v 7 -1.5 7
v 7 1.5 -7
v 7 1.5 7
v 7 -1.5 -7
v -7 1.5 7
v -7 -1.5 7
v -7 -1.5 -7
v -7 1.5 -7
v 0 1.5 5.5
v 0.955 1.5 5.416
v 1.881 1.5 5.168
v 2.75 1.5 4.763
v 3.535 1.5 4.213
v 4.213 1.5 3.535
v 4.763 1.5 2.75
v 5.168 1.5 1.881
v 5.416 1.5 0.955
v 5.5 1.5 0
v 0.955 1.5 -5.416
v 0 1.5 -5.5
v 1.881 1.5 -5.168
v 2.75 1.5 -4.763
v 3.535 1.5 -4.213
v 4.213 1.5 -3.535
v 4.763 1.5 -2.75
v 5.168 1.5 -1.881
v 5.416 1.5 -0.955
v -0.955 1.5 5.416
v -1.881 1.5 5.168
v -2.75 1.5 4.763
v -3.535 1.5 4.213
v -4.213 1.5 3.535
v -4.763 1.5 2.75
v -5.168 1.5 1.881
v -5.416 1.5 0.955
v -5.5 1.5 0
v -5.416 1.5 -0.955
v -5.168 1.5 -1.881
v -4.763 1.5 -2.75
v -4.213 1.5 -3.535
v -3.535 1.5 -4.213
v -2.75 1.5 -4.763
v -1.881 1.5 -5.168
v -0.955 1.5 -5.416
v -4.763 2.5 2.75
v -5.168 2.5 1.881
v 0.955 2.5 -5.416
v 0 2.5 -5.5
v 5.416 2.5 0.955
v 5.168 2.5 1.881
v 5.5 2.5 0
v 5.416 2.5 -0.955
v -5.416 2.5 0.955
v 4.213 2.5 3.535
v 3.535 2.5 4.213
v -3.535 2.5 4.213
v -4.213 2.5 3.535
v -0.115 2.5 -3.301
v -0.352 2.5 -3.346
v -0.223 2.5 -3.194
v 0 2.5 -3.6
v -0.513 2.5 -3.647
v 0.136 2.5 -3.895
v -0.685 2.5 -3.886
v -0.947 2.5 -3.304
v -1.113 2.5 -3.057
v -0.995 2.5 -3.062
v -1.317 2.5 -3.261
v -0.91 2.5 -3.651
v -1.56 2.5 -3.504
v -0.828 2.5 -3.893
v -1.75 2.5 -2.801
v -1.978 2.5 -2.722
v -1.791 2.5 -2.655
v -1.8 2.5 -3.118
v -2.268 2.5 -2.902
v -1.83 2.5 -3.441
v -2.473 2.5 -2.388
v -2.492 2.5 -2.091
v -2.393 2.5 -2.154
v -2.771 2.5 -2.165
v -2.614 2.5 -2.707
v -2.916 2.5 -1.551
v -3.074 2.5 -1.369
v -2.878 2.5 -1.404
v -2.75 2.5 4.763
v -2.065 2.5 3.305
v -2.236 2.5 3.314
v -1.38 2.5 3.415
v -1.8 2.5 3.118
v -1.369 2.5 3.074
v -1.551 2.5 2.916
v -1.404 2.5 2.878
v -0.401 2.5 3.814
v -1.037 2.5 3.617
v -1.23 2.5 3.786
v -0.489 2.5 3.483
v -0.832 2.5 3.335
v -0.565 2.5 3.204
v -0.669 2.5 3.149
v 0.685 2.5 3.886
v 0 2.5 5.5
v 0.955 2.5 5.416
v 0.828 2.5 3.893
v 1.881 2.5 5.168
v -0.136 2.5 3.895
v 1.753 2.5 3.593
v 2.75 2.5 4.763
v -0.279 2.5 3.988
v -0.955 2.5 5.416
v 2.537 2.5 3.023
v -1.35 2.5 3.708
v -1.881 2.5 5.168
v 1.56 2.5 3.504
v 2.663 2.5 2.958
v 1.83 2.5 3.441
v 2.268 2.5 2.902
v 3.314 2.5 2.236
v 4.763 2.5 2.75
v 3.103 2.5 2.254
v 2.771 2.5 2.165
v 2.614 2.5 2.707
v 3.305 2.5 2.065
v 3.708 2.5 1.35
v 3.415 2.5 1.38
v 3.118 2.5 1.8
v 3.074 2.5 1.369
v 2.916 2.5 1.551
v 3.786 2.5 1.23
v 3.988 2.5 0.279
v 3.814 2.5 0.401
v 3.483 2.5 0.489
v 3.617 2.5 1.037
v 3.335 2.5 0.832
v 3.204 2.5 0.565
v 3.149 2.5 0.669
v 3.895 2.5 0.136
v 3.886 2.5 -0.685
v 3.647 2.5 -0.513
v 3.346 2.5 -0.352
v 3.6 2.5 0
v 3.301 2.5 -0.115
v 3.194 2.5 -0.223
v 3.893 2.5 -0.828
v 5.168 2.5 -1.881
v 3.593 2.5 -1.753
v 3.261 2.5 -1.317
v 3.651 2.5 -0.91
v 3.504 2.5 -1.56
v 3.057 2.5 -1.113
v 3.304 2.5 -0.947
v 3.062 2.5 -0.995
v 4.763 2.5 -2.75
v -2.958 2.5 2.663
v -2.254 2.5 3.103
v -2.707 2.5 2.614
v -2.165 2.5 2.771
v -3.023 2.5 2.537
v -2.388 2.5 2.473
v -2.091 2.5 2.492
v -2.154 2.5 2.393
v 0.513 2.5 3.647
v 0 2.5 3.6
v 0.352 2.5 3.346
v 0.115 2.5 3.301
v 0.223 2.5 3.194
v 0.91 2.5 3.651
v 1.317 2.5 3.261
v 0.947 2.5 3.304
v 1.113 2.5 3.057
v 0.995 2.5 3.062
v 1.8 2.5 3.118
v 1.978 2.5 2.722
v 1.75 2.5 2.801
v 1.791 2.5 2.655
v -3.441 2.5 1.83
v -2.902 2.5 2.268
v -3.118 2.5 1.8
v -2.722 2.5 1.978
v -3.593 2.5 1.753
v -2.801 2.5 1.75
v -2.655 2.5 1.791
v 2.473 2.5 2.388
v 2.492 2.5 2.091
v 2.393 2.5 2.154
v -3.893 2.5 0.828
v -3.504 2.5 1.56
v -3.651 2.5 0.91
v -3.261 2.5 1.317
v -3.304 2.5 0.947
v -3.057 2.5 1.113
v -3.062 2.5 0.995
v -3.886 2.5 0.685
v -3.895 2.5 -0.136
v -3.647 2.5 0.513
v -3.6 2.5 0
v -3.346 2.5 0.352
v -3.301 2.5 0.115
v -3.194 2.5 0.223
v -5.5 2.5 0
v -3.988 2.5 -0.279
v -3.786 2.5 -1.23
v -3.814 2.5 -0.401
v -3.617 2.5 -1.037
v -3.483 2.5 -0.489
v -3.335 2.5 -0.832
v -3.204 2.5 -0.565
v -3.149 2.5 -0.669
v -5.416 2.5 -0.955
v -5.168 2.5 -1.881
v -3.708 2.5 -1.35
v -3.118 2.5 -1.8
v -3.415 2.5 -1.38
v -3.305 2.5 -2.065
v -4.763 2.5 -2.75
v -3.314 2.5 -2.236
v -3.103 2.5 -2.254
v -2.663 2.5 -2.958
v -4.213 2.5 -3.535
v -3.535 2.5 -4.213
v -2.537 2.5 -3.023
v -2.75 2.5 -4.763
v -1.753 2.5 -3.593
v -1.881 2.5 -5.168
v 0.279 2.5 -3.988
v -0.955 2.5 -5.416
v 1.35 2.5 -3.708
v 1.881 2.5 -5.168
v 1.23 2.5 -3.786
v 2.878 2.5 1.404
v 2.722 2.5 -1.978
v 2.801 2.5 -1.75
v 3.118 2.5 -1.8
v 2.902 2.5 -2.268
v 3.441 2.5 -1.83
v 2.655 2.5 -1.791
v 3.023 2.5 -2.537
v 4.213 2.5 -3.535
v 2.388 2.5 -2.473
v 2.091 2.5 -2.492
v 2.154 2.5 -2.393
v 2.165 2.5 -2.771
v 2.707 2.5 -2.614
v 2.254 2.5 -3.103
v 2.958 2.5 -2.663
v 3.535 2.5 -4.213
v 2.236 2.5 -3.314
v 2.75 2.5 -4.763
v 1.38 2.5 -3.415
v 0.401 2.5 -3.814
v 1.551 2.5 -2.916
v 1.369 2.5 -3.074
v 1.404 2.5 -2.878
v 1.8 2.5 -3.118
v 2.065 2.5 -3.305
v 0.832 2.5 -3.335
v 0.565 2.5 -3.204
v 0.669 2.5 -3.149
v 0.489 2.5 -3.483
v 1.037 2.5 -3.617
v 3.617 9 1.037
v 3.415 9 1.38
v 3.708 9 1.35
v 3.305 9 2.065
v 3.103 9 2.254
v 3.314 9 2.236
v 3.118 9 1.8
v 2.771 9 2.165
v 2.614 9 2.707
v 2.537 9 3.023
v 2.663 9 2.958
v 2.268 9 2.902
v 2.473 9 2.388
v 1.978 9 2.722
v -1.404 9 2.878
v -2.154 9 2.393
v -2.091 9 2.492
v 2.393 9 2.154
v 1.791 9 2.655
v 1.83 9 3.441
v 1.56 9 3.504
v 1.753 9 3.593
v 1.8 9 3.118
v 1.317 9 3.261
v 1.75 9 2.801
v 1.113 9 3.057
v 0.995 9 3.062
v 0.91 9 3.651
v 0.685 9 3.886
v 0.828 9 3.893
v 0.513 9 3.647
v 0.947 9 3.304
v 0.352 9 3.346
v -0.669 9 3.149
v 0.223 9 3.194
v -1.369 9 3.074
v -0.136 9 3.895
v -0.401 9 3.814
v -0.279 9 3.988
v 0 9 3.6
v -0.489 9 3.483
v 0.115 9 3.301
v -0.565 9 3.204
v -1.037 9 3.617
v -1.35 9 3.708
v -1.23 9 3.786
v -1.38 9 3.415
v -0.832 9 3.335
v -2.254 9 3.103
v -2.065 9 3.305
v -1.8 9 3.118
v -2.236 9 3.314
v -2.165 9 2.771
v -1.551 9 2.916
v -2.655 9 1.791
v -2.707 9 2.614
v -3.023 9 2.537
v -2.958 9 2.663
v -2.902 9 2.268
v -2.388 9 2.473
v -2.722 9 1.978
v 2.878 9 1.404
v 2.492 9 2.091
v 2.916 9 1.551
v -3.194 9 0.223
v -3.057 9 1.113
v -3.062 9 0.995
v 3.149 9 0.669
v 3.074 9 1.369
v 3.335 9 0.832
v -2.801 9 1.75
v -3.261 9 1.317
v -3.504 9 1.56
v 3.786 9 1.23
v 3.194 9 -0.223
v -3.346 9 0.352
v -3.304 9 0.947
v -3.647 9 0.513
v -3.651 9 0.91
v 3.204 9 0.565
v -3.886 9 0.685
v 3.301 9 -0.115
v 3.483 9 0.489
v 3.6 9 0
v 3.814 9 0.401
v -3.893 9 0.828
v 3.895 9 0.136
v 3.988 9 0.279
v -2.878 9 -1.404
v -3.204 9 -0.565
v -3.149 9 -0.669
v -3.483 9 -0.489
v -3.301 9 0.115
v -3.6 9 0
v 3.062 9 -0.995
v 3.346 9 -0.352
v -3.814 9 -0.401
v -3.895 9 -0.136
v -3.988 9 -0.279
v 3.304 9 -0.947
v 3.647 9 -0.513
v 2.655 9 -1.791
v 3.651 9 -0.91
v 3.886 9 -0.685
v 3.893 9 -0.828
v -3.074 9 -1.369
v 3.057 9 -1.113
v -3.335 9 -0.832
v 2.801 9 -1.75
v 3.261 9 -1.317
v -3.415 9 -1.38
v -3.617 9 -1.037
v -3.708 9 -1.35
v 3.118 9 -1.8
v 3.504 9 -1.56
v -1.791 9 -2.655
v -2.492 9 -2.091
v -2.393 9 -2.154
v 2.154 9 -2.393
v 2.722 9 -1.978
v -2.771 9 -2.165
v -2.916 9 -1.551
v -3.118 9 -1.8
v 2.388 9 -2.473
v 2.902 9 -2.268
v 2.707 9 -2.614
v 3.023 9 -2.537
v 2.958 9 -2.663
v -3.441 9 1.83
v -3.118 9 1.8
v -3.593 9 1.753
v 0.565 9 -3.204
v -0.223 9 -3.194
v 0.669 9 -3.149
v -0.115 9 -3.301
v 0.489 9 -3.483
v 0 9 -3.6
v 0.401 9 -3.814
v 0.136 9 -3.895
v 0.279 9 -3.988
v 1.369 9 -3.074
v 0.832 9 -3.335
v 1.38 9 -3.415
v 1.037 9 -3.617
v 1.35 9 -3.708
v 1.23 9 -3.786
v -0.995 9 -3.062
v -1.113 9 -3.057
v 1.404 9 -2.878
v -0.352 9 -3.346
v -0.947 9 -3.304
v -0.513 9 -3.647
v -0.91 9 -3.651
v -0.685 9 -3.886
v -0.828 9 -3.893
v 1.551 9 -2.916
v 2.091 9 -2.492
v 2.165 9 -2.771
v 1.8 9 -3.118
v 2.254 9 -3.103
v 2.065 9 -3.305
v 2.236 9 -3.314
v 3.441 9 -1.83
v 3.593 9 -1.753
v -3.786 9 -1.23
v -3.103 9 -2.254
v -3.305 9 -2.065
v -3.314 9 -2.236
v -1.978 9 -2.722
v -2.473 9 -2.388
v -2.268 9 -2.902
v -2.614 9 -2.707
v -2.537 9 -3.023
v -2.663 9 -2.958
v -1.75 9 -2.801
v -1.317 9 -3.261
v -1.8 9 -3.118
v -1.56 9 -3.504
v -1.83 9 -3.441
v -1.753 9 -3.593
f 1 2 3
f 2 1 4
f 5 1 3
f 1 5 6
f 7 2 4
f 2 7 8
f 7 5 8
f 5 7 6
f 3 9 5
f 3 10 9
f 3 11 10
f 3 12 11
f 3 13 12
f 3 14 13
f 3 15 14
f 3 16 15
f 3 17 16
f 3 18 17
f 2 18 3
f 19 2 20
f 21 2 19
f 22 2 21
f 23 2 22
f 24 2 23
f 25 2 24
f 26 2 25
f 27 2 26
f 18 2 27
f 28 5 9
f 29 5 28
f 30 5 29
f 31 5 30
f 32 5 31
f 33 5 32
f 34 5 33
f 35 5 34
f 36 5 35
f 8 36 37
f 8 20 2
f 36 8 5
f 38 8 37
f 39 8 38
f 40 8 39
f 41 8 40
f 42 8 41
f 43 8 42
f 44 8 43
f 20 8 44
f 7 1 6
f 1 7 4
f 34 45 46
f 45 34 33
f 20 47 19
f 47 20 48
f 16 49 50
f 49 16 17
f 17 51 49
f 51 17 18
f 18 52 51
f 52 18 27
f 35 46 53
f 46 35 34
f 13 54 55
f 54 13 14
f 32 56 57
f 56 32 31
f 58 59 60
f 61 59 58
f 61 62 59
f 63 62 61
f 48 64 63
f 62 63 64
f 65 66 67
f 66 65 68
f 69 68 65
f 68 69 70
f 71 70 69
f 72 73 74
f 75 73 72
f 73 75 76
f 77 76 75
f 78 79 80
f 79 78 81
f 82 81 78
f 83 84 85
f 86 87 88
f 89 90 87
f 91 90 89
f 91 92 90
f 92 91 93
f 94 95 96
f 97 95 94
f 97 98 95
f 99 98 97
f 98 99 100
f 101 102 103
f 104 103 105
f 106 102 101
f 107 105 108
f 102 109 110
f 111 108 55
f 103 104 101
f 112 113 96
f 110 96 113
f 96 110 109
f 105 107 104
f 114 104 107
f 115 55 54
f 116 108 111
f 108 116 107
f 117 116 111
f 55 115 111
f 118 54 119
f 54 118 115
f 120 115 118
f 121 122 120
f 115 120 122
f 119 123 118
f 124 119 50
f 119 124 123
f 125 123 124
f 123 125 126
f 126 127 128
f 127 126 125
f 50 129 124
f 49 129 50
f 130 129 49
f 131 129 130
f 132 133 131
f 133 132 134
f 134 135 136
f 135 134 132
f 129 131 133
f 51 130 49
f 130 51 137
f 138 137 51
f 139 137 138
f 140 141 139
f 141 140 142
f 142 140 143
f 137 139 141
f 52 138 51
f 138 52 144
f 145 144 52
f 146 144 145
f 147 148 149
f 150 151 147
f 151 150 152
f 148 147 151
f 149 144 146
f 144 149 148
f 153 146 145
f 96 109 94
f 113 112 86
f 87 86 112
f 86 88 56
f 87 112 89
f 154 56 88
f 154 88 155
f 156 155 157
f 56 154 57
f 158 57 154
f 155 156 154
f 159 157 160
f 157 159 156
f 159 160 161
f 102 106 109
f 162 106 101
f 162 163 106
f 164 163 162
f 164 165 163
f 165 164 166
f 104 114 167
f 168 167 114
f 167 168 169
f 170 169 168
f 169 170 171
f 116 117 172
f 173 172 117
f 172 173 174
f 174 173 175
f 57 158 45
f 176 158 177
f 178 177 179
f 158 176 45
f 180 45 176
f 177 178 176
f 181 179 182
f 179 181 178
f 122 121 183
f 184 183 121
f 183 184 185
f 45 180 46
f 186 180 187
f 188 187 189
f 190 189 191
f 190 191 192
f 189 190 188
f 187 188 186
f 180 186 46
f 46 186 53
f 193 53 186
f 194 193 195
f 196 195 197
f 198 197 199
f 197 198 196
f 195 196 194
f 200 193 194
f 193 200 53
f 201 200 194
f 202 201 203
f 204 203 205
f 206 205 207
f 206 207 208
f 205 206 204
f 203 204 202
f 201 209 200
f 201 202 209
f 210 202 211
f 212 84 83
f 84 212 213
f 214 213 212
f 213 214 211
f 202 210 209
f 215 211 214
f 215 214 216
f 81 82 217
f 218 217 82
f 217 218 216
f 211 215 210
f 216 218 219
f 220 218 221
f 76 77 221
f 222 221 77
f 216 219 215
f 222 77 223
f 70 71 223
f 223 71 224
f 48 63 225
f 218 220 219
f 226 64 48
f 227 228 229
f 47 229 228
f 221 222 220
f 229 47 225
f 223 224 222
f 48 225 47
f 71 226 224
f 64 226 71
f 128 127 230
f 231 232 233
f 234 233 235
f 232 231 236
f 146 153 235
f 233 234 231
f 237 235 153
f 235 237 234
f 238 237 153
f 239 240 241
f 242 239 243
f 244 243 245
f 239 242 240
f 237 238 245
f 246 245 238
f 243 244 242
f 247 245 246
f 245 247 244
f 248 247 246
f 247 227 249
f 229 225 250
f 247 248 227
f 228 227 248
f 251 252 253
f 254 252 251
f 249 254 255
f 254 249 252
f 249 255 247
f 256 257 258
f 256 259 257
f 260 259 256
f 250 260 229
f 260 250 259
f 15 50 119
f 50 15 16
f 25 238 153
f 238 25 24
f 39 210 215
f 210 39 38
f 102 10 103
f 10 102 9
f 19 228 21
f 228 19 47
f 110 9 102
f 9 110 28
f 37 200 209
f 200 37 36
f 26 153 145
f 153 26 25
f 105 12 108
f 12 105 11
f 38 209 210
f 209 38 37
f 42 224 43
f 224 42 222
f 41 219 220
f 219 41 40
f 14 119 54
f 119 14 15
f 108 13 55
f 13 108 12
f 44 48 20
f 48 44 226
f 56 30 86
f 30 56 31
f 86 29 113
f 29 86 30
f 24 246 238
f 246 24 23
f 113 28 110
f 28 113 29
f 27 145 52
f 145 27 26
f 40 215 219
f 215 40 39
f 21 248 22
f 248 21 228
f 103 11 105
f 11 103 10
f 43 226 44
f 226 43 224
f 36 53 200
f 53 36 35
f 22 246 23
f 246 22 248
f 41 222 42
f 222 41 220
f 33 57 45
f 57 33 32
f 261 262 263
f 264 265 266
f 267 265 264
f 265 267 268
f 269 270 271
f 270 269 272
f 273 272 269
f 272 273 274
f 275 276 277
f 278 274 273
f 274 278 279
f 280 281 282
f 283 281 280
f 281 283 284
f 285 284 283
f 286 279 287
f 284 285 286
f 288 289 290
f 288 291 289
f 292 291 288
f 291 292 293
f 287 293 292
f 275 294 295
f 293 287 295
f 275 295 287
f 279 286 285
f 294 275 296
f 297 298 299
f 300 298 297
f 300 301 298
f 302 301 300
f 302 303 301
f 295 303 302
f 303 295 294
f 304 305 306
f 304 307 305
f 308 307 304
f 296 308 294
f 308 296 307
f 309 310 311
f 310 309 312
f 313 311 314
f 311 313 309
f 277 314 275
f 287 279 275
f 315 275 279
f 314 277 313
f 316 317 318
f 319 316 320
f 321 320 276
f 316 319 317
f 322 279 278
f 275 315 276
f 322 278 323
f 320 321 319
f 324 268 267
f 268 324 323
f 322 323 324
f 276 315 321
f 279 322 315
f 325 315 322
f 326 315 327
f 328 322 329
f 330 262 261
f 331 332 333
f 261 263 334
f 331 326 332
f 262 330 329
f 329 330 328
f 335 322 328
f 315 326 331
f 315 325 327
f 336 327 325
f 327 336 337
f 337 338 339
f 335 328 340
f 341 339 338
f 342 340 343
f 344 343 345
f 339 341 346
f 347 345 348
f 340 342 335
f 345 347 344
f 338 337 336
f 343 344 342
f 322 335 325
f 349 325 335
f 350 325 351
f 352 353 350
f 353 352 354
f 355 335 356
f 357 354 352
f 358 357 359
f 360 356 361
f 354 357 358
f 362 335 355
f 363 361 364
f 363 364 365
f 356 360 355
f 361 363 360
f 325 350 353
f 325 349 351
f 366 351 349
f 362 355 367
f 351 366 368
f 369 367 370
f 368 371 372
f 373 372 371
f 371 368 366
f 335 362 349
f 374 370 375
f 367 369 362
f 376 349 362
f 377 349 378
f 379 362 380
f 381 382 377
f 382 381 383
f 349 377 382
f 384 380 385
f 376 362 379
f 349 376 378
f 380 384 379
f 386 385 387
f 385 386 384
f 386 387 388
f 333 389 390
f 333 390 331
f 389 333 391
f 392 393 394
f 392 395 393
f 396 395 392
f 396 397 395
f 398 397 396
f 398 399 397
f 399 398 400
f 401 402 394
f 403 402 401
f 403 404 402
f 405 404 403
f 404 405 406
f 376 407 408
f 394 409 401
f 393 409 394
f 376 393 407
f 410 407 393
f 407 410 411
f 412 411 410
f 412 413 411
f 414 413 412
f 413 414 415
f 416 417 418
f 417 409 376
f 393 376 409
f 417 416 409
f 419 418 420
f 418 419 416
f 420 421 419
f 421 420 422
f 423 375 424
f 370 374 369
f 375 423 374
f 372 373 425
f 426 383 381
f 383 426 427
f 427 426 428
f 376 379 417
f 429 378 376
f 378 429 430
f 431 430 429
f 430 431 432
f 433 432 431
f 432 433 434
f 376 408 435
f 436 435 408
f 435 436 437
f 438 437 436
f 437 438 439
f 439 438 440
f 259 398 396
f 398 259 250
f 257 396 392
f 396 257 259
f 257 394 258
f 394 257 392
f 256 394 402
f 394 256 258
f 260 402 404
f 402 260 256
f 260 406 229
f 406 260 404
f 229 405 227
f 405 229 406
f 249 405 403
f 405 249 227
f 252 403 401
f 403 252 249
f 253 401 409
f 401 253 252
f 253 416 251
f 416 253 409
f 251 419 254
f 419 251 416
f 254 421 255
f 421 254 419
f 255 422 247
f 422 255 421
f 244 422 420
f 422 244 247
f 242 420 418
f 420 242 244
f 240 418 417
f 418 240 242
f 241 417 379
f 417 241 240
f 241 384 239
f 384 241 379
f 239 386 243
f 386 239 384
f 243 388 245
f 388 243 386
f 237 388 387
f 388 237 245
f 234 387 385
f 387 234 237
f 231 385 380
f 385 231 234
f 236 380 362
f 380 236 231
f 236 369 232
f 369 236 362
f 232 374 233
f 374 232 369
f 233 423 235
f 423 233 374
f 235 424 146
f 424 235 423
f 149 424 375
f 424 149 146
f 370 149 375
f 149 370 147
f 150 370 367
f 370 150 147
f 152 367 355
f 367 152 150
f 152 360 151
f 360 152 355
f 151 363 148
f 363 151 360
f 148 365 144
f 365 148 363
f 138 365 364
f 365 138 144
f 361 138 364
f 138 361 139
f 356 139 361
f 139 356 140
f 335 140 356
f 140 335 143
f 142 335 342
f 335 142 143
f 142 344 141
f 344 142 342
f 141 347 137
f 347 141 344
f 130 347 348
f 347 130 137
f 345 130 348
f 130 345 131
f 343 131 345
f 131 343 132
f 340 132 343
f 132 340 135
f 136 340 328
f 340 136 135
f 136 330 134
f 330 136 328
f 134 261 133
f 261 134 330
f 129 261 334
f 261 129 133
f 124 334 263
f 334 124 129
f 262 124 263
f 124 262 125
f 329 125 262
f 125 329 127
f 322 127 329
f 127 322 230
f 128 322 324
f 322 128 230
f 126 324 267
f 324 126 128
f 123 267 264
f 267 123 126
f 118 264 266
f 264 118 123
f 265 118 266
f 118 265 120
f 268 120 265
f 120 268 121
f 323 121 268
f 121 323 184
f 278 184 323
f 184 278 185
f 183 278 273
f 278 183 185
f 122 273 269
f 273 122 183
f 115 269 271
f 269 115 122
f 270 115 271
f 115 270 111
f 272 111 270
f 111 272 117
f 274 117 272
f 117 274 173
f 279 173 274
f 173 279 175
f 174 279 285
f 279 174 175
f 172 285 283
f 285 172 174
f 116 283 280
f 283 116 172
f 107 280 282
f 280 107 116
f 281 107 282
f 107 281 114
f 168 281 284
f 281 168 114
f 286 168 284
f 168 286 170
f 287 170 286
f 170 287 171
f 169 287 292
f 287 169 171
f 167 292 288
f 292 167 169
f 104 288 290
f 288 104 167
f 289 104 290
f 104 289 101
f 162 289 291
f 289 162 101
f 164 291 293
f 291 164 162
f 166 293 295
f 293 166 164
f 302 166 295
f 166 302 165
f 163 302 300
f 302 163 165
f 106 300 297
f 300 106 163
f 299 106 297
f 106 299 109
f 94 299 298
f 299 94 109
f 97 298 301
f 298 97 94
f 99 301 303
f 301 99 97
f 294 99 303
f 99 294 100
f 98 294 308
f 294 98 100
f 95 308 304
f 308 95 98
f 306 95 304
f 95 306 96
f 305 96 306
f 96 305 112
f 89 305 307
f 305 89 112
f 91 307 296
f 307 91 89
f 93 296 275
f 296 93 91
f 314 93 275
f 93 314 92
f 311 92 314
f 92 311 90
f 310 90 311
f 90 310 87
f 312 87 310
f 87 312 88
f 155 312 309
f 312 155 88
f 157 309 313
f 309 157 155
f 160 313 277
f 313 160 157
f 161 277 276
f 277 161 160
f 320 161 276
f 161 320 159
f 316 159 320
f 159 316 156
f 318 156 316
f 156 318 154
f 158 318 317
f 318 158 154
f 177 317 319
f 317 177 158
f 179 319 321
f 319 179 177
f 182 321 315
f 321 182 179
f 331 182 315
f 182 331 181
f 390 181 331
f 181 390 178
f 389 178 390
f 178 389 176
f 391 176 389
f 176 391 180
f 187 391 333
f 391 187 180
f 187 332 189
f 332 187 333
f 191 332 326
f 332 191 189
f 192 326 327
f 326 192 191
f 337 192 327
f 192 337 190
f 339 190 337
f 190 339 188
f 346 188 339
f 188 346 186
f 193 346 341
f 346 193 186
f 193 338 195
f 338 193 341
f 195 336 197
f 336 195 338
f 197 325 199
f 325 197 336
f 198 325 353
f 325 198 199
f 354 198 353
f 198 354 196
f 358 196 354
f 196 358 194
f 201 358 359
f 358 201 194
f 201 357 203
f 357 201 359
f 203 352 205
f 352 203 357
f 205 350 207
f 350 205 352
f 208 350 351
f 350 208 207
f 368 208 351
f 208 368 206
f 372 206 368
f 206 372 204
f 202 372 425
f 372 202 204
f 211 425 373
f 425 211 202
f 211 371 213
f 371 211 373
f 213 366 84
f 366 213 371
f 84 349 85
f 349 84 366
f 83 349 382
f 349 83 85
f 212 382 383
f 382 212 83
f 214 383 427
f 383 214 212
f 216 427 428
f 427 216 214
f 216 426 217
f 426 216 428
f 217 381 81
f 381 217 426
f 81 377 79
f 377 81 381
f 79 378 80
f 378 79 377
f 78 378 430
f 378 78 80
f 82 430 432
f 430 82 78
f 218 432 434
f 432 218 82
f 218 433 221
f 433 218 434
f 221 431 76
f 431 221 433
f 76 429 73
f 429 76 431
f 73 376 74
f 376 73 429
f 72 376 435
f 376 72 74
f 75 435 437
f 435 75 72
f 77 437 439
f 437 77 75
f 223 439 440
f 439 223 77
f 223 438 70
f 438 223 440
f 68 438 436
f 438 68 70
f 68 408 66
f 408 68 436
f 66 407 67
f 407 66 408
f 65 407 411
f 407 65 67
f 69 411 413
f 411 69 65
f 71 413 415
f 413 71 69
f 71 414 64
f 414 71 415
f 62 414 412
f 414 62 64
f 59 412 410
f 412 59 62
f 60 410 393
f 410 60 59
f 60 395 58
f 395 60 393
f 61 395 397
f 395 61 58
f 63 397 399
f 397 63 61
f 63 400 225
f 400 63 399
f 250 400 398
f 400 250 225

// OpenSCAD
//
//  A wobbly circle polygon
//  Sarah Kelley, 8/26/2020
//

//radius = 8.2;  // [0:20]
//wobble = 6;  // [0:50]
//wobbleRadius = 0.4; // [1:20]
//step = 4;     // [1:90]

module wobblyCircleExtrude(
    radius=10, wobble=6, wobbleRadius=2, step=4, 
    height=10,
    convexity=10) 
{        
    function circleFn(r, wobble, wobbleRadius, deg) =
        let(bar=r-(sin(deg*wobble)*wobbleRadius))
            [bar*sin(deg),bar*cos(deg)];

    circlePoints = [for (deg=[0:step:360]) 
        circleFn(radius,wobble, wobbleRadius, deg)];
    circlePath = 
        concat([ for (i=[0:len(circlePoints)-1]) i ],0);
    
    linear_extrude(height=height, center=true, convexity=convexity)
        polygon(circlePoints, [circlePath]);
}

module tester() {
    thickness = 3;
    shoulderThickness = 1;
    bearingMountThickness = 7;
    shoulderDiameter = 11;
    bearingMountDiameter = 7.2;
    bearingMountWobble = 24;
    bearingMountWobbleRadius = 0.4;
    bearingMountStep = 2;
    cube([14,thickness,14],center=true);
    translate([0,(thickness/2)+(shoulderThickness/2),0])
        rotate([90,0,0]) 
            cylinder(d=shoulderDiameter,h=shoulderThickness,center=true, $fn=36);
    translate([0,(thickness/2)+(shoulderThickness/2)+(bearingMountThickness/2),0]) 
        rotate([90,0,0]) wobblyCircleExtrude(bearingMountDiameter/2, 
            bearingMountWobble, bearingMountWobbleRadius, bearingMountStep,
        height=bearingMountThickness);
}

module spindle(
    bearingWidth = 7,
    bearingDiameter = 23, // 22 was too small with 0.4mm nozzle,
    spindleDiameter = 28,
    spindleLength = 20
)
{
    difference() {
        cylinder(d=spindleDiameter, h=spindleLength, center=true, $fn=72);
        translate([0,0,(spindleLength/2)-(bearingWidth/2)+0.1])
            cylinder(d=bearingDiameter, h=bearingWidth, center=true, $fn=72);
        translate([0,0,-(spindleLength/2)+(bearingWidth/2)-0.1])
            cylinder(d=bearingDiameter, h=bearingWidth, center=true, $fn=72);

    }
}

tester();
//spindle();
/*
for (z = [0:.1:.5]) {
    translate([0,0,z*3]) rotate([0,0,z*60])
    wobblyCircleExtrude(radius, wobble, wobbleRadius, step,
        height=2);
}
*/
